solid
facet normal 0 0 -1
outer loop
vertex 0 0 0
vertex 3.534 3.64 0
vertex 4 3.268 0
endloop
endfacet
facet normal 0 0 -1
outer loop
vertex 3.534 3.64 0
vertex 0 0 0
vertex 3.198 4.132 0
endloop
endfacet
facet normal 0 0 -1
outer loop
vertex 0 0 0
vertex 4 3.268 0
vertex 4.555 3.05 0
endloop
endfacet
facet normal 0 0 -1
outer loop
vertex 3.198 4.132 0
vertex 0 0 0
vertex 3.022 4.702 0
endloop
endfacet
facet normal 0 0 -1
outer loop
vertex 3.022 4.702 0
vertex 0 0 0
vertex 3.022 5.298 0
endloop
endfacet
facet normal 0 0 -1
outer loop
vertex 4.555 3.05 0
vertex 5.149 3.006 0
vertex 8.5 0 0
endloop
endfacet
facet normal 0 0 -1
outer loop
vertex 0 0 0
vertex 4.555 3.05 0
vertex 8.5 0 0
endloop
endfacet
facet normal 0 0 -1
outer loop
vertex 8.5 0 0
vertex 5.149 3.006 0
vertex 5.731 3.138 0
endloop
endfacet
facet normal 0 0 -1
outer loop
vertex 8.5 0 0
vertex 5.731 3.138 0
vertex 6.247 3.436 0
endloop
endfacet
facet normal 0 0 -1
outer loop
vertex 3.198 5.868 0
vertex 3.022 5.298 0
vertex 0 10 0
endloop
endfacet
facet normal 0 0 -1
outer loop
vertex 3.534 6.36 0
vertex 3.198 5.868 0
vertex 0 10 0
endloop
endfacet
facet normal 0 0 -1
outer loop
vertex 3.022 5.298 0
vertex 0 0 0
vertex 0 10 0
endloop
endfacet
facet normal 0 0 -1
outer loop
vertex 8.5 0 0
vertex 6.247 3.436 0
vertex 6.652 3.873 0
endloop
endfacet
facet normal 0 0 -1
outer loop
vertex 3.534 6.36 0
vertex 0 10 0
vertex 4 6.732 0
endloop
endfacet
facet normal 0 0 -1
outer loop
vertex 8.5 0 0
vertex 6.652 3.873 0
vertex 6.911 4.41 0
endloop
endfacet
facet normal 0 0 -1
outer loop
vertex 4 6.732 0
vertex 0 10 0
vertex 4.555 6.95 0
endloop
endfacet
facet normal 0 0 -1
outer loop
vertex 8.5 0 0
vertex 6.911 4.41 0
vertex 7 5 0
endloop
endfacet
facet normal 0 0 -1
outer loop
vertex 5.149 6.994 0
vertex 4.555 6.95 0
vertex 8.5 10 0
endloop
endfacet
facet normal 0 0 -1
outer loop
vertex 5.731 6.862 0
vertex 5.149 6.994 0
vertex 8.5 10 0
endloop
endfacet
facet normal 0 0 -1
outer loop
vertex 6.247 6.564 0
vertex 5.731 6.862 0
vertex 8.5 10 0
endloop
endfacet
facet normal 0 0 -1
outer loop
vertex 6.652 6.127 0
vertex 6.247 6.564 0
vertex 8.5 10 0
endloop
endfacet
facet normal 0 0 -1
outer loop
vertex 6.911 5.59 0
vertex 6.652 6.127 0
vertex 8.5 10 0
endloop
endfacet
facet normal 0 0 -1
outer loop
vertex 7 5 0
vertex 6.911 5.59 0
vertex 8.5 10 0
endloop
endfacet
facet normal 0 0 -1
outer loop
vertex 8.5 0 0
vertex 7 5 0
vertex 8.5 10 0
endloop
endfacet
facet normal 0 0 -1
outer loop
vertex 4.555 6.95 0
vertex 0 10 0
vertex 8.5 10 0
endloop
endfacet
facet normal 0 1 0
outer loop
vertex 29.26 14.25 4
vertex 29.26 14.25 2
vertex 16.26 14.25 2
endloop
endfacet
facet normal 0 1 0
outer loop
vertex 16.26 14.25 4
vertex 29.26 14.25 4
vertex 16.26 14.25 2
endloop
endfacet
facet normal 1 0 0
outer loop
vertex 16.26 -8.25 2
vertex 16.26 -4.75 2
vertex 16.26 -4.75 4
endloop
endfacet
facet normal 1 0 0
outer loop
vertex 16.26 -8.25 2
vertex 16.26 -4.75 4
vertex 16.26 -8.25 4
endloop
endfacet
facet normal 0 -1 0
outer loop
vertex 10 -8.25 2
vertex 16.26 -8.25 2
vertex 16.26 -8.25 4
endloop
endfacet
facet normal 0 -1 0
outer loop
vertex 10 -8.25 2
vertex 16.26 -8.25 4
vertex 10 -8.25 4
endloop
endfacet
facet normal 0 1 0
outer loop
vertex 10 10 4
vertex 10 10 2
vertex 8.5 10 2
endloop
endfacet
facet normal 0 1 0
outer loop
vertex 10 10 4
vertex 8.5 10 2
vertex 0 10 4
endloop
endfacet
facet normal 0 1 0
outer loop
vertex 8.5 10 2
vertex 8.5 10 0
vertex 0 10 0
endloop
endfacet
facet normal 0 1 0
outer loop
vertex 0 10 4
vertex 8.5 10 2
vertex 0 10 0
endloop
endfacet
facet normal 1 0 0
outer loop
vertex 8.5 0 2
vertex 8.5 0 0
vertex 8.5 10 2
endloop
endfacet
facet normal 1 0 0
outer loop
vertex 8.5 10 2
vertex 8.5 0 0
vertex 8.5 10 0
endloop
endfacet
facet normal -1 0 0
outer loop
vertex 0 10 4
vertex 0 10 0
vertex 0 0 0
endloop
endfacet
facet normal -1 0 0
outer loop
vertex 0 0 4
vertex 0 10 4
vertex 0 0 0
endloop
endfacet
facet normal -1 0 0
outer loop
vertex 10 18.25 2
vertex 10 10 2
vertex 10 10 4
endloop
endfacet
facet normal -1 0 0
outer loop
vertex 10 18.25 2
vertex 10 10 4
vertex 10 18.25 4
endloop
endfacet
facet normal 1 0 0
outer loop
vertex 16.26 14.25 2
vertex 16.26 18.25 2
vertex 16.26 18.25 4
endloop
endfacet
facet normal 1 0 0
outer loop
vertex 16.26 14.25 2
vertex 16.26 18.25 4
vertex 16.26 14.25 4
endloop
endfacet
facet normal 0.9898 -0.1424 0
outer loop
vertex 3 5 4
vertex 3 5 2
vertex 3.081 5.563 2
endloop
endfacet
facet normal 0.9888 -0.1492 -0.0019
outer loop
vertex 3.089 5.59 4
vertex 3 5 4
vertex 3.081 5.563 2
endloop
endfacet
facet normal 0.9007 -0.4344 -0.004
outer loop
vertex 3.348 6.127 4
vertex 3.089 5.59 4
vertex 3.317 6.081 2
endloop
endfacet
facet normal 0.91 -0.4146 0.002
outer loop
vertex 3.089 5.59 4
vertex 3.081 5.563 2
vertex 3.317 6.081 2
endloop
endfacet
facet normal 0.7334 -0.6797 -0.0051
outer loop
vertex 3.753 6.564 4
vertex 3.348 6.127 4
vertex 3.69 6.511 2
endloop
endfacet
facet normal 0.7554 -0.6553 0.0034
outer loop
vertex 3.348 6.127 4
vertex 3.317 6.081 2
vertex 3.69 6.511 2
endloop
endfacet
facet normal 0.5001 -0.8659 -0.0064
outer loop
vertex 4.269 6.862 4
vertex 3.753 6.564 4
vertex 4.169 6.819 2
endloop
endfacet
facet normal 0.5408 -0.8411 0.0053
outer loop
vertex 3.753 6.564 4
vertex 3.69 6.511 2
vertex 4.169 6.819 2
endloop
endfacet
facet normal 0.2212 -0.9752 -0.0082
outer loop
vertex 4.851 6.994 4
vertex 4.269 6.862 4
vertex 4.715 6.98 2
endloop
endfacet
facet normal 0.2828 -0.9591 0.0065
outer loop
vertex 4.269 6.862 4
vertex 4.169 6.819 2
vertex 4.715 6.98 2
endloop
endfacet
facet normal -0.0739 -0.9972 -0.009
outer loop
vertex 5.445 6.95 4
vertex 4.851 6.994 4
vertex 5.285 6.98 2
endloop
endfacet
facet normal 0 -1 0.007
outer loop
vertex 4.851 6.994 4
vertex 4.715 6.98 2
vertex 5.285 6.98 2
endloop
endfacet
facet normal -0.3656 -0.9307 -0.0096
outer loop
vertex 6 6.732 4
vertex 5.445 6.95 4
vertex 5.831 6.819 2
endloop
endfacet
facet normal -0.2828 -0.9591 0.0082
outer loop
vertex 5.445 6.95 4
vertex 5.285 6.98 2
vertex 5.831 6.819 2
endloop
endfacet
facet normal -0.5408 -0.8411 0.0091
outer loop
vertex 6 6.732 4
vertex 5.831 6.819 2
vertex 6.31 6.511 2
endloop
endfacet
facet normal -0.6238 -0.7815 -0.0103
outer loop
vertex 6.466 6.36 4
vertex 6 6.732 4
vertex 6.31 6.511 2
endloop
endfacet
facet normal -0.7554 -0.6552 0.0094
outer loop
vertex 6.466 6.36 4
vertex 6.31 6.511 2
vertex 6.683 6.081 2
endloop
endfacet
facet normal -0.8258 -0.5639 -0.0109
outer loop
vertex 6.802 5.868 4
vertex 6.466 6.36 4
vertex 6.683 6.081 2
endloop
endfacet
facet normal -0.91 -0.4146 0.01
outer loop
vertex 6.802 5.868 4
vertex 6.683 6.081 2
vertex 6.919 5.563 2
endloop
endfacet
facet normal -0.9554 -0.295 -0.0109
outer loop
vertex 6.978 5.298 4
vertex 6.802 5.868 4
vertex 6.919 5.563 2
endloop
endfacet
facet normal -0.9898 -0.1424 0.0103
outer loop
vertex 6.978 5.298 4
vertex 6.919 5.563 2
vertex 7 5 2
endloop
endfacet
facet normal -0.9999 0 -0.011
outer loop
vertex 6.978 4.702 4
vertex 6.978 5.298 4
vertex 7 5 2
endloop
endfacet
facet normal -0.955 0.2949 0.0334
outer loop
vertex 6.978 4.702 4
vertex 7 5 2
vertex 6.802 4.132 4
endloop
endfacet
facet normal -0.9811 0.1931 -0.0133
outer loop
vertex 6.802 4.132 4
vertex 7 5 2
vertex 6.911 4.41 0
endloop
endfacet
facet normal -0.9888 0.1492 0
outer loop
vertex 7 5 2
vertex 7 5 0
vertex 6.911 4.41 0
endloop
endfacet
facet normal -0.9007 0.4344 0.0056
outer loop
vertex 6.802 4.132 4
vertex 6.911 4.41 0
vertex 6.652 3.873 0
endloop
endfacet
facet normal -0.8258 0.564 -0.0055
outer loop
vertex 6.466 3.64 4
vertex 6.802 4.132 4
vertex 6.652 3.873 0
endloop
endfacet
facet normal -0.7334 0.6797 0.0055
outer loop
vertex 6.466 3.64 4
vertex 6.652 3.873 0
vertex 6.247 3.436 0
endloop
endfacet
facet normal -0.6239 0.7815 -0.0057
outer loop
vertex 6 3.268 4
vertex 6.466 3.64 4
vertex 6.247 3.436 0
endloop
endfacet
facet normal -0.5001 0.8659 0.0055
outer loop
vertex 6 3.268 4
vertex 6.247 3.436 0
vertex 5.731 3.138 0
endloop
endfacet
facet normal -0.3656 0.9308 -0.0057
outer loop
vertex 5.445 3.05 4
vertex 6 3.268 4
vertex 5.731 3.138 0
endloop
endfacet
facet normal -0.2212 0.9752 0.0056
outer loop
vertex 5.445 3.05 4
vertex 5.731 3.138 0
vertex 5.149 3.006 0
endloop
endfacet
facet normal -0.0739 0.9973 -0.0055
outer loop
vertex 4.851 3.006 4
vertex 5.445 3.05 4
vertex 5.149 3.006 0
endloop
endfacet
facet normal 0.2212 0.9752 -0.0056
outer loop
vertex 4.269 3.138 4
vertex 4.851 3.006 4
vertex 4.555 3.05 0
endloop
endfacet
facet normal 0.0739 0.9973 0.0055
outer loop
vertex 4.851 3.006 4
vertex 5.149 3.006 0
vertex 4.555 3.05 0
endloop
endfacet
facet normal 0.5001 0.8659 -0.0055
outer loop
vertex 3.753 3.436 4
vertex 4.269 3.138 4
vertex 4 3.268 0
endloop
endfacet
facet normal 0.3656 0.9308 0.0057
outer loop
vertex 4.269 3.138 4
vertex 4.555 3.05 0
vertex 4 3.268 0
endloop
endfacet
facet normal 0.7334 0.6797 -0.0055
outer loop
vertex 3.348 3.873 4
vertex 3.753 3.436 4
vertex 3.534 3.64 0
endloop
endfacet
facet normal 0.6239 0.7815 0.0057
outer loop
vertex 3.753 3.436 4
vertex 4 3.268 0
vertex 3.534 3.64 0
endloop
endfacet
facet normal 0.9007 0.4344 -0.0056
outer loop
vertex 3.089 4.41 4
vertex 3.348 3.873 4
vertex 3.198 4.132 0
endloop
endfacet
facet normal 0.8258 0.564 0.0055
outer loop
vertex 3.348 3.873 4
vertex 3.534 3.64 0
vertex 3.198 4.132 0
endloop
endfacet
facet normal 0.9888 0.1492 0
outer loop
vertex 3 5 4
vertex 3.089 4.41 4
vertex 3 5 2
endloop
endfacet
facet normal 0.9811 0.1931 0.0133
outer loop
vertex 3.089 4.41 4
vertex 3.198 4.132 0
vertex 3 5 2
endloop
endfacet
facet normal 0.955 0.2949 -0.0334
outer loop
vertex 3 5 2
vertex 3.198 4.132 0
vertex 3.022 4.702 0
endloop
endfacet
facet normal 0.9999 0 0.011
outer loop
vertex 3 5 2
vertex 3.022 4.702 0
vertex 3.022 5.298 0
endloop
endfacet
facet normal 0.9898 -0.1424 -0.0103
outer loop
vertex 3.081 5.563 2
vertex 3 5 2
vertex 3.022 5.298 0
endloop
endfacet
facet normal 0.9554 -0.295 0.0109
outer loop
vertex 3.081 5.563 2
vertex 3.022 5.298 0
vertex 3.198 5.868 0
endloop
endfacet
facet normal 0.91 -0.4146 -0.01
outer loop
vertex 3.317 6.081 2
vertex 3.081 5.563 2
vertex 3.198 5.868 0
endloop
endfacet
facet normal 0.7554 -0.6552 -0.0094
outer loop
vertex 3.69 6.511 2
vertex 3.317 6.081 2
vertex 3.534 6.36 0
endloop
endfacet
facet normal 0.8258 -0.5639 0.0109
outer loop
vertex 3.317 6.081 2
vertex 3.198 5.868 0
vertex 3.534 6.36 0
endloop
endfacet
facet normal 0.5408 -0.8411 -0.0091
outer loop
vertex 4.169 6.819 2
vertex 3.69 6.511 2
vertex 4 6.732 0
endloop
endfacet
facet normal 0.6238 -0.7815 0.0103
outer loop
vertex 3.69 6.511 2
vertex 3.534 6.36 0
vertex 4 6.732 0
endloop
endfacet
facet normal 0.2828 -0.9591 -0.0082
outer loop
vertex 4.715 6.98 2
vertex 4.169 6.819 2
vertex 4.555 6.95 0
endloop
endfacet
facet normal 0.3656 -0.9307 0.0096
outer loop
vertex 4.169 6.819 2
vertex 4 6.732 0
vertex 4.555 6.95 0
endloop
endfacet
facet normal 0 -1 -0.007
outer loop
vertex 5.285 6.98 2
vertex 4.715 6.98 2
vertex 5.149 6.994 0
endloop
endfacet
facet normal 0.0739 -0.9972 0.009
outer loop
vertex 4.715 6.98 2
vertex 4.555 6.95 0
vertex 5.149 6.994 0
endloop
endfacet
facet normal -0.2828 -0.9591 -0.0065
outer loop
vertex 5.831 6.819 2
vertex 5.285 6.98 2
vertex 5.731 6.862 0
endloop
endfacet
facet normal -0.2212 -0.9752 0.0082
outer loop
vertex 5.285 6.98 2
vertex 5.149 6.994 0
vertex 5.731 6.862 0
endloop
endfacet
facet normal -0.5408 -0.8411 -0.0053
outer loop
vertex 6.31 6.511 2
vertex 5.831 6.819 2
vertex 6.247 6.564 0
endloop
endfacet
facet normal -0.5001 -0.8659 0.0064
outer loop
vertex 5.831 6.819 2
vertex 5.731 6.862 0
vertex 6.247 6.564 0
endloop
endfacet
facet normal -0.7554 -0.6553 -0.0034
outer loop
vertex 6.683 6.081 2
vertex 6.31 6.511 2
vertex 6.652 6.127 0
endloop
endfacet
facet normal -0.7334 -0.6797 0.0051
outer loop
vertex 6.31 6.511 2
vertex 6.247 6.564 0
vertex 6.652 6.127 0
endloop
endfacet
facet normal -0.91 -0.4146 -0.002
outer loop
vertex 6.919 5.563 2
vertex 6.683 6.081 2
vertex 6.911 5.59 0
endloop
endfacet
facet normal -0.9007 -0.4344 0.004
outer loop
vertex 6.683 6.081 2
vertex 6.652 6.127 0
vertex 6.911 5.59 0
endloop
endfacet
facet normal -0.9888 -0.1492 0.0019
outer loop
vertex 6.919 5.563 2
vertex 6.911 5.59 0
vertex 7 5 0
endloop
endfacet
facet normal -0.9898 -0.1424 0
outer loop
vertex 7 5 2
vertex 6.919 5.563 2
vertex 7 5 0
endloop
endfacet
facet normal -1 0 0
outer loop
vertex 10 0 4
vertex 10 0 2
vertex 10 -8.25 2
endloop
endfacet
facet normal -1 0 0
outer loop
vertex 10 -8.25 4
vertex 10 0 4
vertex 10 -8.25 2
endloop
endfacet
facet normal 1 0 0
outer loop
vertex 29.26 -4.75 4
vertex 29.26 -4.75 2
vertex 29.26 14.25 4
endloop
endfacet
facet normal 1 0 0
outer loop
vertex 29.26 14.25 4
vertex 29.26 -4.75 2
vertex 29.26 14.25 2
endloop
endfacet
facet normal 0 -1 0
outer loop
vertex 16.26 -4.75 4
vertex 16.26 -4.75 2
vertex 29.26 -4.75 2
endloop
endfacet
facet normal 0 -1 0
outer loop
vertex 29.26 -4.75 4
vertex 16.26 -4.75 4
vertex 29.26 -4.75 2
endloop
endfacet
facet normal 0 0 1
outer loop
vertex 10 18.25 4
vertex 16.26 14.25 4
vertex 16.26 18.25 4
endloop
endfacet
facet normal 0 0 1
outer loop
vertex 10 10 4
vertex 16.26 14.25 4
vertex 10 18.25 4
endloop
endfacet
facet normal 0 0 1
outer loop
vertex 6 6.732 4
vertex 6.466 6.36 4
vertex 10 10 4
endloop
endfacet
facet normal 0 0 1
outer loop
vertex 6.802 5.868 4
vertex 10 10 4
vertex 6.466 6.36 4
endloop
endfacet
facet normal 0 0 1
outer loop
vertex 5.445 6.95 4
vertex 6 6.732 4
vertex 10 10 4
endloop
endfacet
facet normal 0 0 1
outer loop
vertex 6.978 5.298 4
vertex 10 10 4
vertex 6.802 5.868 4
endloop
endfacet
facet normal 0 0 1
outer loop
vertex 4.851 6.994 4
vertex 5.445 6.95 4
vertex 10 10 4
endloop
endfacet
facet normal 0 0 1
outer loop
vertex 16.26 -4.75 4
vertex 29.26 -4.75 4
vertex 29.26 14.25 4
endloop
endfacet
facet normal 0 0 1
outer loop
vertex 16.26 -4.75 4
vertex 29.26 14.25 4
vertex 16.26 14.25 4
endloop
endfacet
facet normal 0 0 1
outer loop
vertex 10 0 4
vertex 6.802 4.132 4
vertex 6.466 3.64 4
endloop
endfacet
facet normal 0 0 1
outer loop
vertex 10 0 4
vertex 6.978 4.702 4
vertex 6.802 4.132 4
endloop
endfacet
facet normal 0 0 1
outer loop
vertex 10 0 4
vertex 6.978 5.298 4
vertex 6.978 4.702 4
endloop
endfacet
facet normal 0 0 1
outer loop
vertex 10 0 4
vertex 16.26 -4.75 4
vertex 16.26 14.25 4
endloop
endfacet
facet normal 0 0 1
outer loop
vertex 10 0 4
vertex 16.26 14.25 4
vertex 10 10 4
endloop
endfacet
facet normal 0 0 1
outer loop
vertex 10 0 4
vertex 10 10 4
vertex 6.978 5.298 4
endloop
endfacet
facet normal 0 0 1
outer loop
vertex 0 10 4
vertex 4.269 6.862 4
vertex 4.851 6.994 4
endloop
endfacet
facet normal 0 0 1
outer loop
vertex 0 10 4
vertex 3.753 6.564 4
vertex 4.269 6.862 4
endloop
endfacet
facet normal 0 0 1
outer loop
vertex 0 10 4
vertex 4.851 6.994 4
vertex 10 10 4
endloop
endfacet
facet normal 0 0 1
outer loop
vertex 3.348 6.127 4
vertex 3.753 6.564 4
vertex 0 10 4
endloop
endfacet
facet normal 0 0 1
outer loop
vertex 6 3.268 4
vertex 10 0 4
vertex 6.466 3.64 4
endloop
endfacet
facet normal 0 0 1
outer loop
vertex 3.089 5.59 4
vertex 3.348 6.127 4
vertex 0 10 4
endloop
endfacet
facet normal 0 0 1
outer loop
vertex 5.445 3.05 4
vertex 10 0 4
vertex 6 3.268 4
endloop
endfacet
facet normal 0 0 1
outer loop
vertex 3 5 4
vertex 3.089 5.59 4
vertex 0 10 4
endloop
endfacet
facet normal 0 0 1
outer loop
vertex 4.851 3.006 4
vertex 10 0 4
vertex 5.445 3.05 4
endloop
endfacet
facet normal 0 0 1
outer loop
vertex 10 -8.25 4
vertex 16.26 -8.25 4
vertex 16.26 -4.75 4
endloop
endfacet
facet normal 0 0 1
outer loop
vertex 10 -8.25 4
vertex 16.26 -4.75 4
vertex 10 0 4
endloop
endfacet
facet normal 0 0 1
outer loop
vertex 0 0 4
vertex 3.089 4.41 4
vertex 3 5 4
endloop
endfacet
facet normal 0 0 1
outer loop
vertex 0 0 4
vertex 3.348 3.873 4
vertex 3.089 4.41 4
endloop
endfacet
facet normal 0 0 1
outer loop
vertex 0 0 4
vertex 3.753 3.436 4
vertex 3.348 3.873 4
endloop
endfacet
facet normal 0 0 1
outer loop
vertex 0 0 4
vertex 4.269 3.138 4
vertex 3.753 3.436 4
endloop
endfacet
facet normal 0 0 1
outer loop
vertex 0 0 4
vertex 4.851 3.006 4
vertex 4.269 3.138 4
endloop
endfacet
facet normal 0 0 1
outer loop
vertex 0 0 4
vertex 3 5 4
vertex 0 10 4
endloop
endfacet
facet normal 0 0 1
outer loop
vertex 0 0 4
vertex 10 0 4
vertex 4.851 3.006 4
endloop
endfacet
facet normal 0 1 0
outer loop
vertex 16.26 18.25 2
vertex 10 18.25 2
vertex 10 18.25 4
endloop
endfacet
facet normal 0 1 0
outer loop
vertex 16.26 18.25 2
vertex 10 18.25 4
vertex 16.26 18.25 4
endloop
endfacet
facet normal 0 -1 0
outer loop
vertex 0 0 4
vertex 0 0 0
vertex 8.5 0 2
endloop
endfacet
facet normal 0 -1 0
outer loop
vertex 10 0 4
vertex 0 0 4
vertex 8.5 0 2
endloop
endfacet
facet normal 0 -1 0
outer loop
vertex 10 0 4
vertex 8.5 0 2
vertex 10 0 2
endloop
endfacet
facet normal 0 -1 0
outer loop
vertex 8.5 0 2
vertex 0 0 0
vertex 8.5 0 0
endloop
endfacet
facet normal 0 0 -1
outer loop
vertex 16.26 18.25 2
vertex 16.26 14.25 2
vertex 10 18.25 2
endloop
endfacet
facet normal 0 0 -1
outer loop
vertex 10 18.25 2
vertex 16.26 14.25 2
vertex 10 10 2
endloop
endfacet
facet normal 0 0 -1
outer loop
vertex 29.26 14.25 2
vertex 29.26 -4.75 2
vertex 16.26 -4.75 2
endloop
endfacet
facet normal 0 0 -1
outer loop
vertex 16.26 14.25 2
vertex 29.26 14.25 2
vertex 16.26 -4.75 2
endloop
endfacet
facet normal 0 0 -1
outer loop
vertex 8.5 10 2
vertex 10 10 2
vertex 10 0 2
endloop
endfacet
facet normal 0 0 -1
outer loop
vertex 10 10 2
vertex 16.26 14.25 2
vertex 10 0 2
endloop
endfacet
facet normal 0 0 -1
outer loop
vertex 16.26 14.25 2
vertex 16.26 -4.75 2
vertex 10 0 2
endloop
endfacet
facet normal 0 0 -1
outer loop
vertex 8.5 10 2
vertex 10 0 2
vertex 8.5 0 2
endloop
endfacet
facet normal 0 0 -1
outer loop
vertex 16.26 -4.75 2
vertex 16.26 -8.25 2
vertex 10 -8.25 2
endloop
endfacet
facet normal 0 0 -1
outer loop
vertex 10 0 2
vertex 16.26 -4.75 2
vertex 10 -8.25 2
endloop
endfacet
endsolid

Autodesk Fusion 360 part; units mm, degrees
sketch "Sketch1" plane through (0, 0, 0) normal (0, 0, 1) x (1, 0, 0)
  line L0 (0, 0) -> (8.5, 0)
  line L1 (8.5, 0) -> (8.5, 10)
  line L2 (8.5, 10) -> (0, 10)
  line L3 (0, 10) -> (0, 0)
  line L4 (0, 10) -> (10, 10)
  line L5 (10, 10) -> (10, 0)
  line L6 (10, 0) -> (0, 0)
  line L7 (0, 0) -> (0, 10)
  line L8 (0, 10) -> (10, 0)
  line L9 (0, 0) -> (10, 10)
  circle A0 centre (5, 5) radius 2
  dimension "d1" = 8.5
  dimension "d2" = 10
  dimension "d3" = 10
  dimension "d4" = 10
  dimension "d5" = 4
extrude "Extrude1" add sketch "Sketch1" along normal blind 2 contours L0 L1 L6 L8 L9 A0 | L3 L7 L8 L9 A0 | L1 L2 L4 L8 L9 A0 | L1 L8 L9 A0
sketch "Sketch2" plane through (0, 0, 2) normal (0, 0, 1) x (-1, 0, 0)
  circle A0 centre (-5, -5) radius 2
  line L0 (-8.5, 0) -> (-8.5, -10)
  line L1 (-8.5, -10) -> (0, -10)
  line L2 (0, -10) -> (0, 0)
  line L3 (0, 0) -> (-8.5, 0)
  line L4 (-8.5, -10) -> (-10, -10)
  line L5 (-10, -10) -> (-10, 0)
  line L6 (-10, 0) -> (-8.5, 0)
  line L7 (-8.5, 0) -> (-8.5, -10)
  line L8 (-10, -5) -> (-10, -18.25)
  line L9 (-10, -18.25) -> (-10, 8.25)
  line L10 (-10, -18.25) -> (-16.26, -18.25)
  line L11 (-16.26, -18.25) -> (-16.26, 8.25)
  line L12 (-16.26, 8.25) -> (-10, 8.25)
  line L13 (-10, 8.25) -> (-10, -18.25)
  line L14 (-16.26, 8.25) -> (-16.26, 4.75)
  line L15 (-16.26, 4.75) -> (-29.26, 4.75)
  line L16 (-29.26, 4.75) -> (-29.26, -14.25)
  line L17 (-29.26, -14.25) -> (-16.26, -14.25)
  line L18 (-16.26, -14.25) -> (-16.26, 4.75)
  dimension "d8" = 1.5
  dimension "d9" = 13.25
  dimension "d10" = 26.5
  dimension "d11" = 6.26
  dimension "d12" = 26.5
  dimension "d13" = 3.5
  dimension "d14" = 13
  dimension "d15" = 19
extrude "Extrude2" add sketch "Sketch2" along normal blind 2
